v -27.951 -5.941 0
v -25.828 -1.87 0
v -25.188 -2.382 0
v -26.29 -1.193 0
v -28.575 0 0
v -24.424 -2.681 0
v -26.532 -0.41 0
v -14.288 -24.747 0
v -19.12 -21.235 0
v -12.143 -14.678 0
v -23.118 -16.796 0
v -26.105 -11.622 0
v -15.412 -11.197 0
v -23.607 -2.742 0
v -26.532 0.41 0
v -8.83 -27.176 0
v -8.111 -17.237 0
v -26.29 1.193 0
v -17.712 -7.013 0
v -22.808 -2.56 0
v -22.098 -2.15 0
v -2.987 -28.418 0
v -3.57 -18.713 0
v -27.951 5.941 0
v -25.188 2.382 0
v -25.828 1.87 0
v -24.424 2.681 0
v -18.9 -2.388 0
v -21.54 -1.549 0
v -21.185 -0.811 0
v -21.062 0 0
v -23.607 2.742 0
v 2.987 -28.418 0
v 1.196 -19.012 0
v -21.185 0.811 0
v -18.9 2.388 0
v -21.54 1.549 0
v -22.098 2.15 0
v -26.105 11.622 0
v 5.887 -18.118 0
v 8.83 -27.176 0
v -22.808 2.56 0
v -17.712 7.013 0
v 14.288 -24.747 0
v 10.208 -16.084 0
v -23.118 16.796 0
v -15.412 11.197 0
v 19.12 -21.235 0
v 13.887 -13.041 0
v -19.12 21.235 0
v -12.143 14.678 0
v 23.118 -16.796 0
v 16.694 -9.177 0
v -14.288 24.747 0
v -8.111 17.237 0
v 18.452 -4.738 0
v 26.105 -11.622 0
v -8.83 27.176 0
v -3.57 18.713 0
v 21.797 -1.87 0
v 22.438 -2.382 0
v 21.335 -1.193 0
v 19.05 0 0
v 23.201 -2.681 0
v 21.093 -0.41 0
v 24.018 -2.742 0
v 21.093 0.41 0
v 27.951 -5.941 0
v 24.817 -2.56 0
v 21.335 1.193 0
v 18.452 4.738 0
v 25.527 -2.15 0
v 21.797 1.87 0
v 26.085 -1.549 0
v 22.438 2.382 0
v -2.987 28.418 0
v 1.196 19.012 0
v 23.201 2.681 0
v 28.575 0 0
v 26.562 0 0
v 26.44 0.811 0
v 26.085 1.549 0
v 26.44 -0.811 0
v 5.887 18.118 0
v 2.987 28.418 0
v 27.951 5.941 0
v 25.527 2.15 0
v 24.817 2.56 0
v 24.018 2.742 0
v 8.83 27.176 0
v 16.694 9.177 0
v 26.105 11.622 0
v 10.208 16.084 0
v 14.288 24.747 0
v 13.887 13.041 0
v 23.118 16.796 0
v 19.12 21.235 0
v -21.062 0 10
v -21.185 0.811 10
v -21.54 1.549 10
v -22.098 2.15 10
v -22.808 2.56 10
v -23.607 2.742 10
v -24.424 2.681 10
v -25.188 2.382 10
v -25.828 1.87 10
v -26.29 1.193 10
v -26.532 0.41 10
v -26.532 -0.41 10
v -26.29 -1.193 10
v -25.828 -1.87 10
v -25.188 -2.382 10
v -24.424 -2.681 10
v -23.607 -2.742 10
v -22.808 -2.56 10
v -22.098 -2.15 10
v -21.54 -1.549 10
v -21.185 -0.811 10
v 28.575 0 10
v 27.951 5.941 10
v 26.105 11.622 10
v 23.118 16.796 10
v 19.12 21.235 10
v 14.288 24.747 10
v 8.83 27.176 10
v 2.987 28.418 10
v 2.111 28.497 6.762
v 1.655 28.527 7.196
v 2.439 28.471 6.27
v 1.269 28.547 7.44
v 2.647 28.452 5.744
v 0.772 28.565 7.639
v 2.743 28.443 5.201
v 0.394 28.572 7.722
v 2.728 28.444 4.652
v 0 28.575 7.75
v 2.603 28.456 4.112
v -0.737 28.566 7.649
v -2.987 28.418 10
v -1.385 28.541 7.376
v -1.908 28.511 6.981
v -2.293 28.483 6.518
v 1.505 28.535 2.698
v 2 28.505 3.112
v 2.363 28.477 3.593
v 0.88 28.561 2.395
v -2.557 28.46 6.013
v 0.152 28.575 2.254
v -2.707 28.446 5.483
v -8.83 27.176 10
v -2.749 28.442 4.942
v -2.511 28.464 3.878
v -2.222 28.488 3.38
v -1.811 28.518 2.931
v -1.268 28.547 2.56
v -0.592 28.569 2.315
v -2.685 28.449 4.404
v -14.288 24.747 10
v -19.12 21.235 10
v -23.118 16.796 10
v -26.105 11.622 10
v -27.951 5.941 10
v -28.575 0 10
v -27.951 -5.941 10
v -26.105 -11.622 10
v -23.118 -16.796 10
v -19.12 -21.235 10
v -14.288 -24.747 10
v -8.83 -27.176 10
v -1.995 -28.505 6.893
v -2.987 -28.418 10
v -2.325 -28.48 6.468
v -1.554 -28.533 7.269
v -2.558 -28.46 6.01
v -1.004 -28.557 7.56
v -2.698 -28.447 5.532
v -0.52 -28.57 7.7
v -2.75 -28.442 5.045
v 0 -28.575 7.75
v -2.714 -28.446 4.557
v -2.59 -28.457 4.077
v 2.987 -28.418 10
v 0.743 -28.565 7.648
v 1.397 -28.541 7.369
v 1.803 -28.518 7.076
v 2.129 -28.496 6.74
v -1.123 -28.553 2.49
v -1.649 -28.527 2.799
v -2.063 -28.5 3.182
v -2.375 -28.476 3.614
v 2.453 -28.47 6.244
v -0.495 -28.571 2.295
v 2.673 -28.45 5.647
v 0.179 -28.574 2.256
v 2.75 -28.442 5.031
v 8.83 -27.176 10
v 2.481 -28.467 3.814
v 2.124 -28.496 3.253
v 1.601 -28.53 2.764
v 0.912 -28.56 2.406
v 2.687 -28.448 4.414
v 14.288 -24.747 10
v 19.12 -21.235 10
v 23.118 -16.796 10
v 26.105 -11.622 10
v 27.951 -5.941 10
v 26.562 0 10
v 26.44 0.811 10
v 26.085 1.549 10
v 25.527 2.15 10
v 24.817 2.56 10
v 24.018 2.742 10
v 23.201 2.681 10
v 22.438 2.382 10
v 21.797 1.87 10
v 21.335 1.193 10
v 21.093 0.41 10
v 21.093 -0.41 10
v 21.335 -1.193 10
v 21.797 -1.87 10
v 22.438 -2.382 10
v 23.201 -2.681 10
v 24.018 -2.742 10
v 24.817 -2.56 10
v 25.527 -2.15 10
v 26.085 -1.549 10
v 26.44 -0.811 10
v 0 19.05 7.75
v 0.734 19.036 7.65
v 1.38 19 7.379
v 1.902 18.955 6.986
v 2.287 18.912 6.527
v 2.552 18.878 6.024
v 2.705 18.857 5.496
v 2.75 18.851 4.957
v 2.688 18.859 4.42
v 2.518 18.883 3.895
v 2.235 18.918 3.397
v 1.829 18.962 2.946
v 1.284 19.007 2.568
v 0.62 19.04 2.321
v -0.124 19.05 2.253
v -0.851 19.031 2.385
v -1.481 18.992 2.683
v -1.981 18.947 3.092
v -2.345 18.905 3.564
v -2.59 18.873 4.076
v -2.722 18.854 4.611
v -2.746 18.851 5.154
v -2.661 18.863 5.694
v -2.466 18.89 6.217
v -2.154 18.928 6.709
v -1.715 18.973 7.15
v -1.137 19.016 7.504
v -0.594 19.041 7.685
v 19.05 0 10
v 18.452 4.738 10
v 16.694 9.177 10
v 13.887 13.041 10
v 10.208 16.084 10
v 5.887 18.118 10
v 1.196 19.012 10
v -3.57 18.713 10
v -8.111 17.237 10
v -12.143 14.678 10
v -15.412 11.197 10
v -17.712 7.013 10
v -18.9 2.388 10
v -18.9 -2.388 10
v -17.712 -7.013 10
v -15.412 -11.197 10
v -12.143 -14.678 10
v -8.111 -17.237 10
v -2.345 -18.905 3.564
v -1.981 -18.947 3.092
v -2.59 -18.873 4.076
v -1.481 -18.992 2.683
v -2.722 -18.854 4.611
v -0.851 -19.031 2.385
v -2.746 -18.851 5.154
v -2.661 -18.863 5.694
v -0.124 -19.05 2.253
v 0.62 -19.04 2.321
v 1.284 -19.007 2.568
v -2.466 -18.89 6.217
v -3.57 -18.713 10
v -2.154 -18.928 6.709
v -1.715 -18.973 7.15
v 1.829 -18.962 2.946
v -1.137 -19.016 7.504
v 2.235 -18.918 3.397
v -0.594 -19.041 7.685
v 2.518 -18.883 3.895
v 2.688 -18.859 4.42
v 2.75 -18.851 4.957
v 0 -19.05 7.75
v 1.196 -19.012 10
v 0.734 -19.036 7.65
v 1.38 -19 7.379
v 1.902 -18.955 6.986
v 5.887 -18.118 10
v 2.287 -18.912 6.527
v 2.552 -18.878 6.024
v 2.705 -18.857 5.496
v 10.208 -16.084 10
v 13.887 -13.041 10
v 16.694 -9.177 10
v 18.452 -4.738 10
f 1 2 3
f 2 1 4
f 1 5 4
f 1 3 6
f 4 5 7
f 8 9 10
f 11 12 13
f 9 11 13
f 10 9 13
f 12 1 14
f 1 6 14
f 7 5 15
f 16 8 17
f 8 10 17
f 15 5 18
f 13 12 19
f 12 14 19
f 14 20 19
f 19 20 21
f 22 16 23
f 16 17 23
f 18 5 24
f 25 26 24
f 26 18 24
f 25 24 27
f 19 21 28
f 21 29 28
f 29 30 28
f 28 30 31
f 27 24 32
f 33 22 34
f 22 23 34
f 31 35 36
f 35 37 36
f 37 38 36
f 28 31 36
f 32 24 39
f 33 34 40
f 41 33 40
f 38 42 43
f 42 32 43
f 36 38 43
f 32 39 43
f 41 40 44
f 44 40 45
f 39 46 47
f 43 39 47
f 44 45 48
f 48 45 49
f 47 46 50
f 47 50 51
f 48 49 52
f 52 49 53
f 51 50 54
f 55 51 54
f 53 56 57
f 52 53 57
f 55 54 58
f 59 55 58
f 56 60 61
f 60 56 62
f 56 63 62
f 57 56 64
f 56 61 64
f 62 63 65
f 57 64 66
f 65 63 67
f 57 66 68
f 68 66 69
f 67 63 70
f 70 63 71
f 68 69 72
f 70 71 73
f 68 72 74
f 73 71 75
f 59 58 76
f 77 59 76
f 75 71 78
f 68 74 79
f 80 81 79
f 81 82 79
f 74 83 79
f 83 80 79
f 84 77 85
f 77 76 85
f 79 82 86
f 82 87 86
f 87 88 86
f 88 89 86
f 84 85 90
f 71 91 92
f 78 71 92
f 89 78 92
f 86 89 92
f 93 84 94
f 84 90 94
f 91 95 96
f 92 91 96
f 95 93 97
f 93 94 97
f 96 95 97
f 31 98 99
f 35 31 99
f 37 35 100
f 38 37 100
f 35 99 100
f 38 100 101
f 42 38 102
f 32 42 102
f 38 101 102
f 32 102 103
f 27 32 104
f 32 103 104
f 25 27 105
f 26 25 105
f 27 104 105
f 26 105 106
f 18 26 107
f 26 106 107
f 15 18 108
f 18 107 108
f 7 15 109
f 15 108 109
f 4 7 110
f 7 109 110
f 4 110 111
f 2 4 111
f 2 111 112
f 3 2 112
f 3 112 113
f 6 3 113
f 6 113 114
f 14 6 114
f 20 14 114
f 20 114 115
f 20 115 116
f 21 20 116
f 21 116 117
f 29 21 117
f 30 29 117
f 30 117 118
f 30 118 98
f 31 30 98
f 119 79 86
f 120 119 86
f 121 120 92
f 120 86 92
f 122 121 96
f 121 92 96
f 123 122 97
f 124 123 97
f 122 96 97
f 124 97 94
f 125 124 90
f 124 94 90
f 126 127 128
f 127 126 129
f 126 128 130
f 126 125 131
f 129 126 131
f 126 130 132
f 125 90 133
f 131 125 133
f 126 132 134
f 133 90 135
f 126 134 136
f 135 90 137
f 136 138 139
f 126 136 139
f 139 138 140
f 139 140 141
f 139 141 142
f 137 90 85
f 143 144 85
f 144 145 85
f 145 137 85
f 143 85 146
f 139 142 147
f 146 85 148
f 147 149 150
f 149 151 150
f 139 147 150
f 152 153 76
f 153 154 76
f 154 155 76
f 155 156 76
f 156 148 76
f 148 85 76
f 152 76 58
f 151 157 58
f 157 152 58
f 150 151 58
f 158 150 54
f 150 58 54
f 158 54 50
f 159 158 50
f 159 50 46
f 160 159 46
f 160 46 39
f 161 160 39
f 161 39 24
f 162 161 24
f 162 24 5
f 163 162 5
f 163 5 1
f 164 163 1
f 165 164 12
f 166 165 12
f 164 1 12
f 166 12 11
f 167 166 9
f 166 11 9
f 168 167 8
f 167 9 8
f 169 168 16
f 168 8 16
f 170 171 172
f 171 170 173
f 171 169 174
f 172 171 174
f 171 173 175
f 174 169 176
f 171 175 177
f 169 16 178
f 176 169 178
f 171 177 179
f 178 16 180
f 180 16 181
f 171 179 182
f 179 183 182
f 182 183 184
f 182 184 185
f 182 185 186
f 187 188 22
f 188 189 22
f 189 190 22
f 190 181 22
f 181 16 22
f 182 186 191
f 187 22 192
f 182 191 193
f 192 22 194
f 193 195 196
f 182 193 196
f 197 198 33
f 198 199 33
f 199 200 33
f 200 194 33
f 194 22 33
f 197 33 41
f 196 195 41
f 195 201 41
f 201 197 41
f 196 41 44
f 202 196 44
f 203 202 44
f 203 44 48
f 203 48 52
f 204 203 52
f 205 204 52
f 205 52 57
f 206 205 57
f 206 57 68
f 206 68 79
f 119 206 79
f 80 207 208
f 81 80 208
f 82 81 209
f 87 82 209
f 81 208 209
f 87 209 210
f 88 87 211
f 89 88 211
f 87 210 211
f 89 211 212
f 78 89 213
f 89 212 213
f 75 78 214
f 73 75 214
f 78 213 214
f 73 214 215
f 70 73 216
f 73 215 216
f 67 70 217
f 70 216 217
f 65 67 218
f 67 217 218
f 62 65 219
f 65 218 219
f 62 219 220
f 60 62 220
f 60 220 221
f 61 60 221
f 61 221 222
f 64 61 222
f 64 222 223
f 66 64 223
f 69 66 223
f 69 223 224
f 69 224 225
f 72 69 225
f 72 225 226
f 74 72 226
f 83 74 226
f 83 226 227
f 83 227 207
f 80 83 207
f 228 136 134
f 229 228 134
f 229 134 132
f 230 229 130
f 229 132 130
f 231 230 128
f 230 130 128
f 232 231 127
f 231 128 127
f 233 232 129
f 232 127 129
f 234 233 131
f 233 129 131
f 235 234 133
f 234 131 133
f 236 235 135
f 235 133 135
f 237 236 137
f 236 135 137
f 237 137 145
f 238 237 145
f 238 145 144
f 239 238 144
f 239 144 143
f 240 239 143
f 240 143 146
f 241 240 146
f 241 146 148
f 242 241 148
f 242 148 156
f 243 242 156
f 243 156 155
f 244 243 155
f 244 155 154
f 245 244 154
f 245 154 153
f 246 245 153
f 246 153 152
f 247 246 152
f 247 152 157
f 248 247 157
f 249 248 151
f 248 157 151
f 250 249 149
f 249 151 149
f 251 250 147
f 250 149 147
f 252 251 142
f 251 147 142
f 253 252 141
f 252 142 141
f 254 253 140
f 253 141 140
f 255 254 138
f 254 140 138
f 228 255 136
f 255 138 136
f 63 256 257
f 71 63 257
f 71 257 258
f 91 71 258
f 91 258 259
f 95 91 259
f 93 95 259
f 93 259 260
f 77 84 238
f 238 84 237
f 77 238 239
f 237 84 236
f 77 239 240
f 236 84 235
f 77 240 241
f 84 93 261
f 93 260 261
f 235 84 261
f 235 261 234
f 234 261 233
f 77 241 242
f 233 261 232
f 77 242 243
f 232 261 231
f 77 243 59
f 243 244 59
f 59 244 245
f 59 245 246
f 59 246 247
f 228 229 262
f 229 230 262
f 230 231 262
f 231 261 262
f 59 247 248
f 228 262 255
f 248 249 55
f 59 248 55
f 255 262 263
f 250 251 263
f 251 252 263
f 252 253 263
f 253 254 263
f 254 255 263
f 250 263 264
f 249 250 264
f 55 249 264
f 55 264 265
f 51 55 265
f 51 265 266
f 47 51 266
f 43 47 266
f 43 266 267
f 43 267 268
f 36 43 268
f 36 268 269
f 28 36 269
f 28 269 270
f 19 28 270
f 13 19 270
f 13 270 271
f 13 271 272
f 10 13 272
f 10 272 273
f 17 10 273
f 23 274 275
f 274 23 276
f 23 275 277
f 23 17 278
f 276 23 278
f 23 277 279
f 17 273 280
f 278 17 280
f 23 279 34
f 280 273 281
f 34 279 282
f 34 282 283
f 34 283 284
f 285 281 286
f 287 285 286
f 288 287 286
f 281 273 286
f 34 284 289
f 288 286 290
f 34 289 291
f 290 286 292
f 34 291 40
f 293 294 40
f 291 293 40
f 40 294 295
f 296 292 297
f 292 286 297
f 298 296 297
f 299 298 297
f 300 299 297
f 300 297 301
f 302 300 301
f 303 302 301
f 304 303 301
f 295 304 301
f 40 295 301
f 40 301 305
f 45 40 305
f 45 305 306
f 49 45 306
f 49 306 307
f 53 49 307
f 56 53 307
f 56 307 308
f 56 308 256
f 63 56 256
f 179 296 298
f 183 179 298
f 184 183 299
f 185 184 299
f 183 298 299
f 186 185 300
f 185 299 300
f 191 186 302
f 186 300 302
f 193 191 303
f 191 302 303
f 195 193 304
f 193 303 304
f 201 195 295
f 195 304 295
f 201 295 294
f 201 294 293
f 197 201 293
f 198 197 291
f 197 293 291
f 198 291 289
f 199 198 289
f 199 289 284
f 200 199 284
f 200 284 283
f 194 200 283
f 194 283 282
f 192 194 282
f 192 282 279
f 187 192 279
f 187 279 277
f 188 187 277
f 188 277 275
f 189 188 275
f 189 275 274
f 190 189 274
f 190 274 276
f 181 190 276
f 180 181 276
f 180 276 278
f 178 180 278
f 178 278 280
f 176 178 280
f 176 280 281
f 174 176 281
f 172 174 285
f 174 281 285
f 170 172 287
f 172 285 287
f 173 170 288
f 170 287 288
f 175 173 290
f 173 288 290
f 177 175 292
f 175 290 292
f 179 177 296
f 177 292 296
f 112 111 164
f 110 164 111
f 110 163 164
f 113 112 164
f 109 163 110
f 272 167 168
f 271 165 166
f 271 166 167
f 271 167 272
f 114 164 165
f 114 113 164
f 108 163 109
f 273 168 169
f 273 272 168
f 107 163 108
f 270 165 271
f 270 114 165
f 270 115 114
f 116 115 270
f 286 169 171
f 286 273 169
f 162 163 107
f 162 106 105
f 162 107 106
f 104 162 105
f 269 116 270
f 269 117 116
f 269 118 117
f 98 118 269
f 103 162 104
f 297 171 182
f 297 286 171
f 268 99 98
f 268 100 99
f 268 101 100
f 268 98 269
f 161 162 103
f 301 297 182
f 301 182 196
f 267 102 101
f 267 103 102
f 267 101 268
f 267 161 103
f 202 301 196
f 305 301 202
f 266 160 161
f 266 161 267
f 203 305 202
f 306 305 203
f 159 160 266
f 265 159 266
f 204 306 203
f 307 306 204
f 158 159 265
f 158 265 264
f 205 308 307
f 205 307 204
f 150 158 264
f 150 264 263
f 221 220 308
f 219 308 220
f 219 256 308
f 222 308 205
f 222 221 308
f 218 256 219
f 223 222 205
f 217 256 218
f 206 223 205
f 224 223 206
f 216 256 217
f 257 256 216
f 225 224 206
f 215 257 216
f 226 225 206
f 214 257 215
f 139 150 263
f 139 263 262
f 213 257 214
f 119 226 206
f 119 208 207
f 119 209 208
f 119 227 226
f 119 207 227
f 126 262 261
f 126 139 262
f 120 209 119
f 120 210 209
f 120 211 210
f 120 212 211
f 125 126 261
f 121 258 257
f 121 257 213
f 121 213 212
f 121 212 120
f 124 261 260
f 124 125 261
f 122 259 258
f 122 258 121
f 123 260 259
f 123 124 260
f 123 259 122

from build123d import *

# Parameters (mm, degrees)
SKETCH1_R           = 28.575
BOSS_EXTRUDE1_DEPTH = 10
SKETCH2_R           = 19.05
CUT_EXTRUDE1_DEPTH  = 42.630052246
SKETCH5_R           = 2.75
CUT_EXTRUDE2_DEPTH  = 65.673434461
SKETCH6_R           = 2.75
CUT_EXTRUDE3_DEPTH  = 42.630052408


with BuildPart() as part:
    # Sketch1 → Boss-Extrude1 (new body)
    with BuildSketch(Plane.XY):
        Circle(SKETCH1_R)
    extrude(amount=BOSS_EXTRUDE1_DEPTH)

    # Sketch2 → Cut-Extrude1 (cut, through all)
    with BuildSketch(Plane.XY.offset(10)):
        Circle(SKETCH2_R)
    extrude(amount=-CUT_EXTRUDE1_DEPTH, mode=Mode.SUBTRACT)

    # Sketch5 → Cut-Extrude2 (cut, through all)
    with BuildSketch(Plane(origin=(0, 28.575, 0), x_dir=(1, 0, 0), z_dir=(0, 1, 0))):
        with Locations(Location((0, -5, 0), (0, 0, 270))):
            Circle(SKETCH5_R)
    extrude(amount=-CUT_EXTRUDE2_DEPTH, mode=Mode.SUBTRACT)

    # Sketch6 → Cut-Extrude3 (cut, through all)
    with BuildSketch(Plane.XY.offset(10)):
        with Locations((-23.8125, 0)):
            Circle(SKETCH6_R)
        with Locations((23.8125, 0)):
            Circle(SKETCH6_R)
    extrude(amount=-CUT_EXTRUDE3_DEPTH, mode=Mode.SUBTRACT)


solid = part.part
